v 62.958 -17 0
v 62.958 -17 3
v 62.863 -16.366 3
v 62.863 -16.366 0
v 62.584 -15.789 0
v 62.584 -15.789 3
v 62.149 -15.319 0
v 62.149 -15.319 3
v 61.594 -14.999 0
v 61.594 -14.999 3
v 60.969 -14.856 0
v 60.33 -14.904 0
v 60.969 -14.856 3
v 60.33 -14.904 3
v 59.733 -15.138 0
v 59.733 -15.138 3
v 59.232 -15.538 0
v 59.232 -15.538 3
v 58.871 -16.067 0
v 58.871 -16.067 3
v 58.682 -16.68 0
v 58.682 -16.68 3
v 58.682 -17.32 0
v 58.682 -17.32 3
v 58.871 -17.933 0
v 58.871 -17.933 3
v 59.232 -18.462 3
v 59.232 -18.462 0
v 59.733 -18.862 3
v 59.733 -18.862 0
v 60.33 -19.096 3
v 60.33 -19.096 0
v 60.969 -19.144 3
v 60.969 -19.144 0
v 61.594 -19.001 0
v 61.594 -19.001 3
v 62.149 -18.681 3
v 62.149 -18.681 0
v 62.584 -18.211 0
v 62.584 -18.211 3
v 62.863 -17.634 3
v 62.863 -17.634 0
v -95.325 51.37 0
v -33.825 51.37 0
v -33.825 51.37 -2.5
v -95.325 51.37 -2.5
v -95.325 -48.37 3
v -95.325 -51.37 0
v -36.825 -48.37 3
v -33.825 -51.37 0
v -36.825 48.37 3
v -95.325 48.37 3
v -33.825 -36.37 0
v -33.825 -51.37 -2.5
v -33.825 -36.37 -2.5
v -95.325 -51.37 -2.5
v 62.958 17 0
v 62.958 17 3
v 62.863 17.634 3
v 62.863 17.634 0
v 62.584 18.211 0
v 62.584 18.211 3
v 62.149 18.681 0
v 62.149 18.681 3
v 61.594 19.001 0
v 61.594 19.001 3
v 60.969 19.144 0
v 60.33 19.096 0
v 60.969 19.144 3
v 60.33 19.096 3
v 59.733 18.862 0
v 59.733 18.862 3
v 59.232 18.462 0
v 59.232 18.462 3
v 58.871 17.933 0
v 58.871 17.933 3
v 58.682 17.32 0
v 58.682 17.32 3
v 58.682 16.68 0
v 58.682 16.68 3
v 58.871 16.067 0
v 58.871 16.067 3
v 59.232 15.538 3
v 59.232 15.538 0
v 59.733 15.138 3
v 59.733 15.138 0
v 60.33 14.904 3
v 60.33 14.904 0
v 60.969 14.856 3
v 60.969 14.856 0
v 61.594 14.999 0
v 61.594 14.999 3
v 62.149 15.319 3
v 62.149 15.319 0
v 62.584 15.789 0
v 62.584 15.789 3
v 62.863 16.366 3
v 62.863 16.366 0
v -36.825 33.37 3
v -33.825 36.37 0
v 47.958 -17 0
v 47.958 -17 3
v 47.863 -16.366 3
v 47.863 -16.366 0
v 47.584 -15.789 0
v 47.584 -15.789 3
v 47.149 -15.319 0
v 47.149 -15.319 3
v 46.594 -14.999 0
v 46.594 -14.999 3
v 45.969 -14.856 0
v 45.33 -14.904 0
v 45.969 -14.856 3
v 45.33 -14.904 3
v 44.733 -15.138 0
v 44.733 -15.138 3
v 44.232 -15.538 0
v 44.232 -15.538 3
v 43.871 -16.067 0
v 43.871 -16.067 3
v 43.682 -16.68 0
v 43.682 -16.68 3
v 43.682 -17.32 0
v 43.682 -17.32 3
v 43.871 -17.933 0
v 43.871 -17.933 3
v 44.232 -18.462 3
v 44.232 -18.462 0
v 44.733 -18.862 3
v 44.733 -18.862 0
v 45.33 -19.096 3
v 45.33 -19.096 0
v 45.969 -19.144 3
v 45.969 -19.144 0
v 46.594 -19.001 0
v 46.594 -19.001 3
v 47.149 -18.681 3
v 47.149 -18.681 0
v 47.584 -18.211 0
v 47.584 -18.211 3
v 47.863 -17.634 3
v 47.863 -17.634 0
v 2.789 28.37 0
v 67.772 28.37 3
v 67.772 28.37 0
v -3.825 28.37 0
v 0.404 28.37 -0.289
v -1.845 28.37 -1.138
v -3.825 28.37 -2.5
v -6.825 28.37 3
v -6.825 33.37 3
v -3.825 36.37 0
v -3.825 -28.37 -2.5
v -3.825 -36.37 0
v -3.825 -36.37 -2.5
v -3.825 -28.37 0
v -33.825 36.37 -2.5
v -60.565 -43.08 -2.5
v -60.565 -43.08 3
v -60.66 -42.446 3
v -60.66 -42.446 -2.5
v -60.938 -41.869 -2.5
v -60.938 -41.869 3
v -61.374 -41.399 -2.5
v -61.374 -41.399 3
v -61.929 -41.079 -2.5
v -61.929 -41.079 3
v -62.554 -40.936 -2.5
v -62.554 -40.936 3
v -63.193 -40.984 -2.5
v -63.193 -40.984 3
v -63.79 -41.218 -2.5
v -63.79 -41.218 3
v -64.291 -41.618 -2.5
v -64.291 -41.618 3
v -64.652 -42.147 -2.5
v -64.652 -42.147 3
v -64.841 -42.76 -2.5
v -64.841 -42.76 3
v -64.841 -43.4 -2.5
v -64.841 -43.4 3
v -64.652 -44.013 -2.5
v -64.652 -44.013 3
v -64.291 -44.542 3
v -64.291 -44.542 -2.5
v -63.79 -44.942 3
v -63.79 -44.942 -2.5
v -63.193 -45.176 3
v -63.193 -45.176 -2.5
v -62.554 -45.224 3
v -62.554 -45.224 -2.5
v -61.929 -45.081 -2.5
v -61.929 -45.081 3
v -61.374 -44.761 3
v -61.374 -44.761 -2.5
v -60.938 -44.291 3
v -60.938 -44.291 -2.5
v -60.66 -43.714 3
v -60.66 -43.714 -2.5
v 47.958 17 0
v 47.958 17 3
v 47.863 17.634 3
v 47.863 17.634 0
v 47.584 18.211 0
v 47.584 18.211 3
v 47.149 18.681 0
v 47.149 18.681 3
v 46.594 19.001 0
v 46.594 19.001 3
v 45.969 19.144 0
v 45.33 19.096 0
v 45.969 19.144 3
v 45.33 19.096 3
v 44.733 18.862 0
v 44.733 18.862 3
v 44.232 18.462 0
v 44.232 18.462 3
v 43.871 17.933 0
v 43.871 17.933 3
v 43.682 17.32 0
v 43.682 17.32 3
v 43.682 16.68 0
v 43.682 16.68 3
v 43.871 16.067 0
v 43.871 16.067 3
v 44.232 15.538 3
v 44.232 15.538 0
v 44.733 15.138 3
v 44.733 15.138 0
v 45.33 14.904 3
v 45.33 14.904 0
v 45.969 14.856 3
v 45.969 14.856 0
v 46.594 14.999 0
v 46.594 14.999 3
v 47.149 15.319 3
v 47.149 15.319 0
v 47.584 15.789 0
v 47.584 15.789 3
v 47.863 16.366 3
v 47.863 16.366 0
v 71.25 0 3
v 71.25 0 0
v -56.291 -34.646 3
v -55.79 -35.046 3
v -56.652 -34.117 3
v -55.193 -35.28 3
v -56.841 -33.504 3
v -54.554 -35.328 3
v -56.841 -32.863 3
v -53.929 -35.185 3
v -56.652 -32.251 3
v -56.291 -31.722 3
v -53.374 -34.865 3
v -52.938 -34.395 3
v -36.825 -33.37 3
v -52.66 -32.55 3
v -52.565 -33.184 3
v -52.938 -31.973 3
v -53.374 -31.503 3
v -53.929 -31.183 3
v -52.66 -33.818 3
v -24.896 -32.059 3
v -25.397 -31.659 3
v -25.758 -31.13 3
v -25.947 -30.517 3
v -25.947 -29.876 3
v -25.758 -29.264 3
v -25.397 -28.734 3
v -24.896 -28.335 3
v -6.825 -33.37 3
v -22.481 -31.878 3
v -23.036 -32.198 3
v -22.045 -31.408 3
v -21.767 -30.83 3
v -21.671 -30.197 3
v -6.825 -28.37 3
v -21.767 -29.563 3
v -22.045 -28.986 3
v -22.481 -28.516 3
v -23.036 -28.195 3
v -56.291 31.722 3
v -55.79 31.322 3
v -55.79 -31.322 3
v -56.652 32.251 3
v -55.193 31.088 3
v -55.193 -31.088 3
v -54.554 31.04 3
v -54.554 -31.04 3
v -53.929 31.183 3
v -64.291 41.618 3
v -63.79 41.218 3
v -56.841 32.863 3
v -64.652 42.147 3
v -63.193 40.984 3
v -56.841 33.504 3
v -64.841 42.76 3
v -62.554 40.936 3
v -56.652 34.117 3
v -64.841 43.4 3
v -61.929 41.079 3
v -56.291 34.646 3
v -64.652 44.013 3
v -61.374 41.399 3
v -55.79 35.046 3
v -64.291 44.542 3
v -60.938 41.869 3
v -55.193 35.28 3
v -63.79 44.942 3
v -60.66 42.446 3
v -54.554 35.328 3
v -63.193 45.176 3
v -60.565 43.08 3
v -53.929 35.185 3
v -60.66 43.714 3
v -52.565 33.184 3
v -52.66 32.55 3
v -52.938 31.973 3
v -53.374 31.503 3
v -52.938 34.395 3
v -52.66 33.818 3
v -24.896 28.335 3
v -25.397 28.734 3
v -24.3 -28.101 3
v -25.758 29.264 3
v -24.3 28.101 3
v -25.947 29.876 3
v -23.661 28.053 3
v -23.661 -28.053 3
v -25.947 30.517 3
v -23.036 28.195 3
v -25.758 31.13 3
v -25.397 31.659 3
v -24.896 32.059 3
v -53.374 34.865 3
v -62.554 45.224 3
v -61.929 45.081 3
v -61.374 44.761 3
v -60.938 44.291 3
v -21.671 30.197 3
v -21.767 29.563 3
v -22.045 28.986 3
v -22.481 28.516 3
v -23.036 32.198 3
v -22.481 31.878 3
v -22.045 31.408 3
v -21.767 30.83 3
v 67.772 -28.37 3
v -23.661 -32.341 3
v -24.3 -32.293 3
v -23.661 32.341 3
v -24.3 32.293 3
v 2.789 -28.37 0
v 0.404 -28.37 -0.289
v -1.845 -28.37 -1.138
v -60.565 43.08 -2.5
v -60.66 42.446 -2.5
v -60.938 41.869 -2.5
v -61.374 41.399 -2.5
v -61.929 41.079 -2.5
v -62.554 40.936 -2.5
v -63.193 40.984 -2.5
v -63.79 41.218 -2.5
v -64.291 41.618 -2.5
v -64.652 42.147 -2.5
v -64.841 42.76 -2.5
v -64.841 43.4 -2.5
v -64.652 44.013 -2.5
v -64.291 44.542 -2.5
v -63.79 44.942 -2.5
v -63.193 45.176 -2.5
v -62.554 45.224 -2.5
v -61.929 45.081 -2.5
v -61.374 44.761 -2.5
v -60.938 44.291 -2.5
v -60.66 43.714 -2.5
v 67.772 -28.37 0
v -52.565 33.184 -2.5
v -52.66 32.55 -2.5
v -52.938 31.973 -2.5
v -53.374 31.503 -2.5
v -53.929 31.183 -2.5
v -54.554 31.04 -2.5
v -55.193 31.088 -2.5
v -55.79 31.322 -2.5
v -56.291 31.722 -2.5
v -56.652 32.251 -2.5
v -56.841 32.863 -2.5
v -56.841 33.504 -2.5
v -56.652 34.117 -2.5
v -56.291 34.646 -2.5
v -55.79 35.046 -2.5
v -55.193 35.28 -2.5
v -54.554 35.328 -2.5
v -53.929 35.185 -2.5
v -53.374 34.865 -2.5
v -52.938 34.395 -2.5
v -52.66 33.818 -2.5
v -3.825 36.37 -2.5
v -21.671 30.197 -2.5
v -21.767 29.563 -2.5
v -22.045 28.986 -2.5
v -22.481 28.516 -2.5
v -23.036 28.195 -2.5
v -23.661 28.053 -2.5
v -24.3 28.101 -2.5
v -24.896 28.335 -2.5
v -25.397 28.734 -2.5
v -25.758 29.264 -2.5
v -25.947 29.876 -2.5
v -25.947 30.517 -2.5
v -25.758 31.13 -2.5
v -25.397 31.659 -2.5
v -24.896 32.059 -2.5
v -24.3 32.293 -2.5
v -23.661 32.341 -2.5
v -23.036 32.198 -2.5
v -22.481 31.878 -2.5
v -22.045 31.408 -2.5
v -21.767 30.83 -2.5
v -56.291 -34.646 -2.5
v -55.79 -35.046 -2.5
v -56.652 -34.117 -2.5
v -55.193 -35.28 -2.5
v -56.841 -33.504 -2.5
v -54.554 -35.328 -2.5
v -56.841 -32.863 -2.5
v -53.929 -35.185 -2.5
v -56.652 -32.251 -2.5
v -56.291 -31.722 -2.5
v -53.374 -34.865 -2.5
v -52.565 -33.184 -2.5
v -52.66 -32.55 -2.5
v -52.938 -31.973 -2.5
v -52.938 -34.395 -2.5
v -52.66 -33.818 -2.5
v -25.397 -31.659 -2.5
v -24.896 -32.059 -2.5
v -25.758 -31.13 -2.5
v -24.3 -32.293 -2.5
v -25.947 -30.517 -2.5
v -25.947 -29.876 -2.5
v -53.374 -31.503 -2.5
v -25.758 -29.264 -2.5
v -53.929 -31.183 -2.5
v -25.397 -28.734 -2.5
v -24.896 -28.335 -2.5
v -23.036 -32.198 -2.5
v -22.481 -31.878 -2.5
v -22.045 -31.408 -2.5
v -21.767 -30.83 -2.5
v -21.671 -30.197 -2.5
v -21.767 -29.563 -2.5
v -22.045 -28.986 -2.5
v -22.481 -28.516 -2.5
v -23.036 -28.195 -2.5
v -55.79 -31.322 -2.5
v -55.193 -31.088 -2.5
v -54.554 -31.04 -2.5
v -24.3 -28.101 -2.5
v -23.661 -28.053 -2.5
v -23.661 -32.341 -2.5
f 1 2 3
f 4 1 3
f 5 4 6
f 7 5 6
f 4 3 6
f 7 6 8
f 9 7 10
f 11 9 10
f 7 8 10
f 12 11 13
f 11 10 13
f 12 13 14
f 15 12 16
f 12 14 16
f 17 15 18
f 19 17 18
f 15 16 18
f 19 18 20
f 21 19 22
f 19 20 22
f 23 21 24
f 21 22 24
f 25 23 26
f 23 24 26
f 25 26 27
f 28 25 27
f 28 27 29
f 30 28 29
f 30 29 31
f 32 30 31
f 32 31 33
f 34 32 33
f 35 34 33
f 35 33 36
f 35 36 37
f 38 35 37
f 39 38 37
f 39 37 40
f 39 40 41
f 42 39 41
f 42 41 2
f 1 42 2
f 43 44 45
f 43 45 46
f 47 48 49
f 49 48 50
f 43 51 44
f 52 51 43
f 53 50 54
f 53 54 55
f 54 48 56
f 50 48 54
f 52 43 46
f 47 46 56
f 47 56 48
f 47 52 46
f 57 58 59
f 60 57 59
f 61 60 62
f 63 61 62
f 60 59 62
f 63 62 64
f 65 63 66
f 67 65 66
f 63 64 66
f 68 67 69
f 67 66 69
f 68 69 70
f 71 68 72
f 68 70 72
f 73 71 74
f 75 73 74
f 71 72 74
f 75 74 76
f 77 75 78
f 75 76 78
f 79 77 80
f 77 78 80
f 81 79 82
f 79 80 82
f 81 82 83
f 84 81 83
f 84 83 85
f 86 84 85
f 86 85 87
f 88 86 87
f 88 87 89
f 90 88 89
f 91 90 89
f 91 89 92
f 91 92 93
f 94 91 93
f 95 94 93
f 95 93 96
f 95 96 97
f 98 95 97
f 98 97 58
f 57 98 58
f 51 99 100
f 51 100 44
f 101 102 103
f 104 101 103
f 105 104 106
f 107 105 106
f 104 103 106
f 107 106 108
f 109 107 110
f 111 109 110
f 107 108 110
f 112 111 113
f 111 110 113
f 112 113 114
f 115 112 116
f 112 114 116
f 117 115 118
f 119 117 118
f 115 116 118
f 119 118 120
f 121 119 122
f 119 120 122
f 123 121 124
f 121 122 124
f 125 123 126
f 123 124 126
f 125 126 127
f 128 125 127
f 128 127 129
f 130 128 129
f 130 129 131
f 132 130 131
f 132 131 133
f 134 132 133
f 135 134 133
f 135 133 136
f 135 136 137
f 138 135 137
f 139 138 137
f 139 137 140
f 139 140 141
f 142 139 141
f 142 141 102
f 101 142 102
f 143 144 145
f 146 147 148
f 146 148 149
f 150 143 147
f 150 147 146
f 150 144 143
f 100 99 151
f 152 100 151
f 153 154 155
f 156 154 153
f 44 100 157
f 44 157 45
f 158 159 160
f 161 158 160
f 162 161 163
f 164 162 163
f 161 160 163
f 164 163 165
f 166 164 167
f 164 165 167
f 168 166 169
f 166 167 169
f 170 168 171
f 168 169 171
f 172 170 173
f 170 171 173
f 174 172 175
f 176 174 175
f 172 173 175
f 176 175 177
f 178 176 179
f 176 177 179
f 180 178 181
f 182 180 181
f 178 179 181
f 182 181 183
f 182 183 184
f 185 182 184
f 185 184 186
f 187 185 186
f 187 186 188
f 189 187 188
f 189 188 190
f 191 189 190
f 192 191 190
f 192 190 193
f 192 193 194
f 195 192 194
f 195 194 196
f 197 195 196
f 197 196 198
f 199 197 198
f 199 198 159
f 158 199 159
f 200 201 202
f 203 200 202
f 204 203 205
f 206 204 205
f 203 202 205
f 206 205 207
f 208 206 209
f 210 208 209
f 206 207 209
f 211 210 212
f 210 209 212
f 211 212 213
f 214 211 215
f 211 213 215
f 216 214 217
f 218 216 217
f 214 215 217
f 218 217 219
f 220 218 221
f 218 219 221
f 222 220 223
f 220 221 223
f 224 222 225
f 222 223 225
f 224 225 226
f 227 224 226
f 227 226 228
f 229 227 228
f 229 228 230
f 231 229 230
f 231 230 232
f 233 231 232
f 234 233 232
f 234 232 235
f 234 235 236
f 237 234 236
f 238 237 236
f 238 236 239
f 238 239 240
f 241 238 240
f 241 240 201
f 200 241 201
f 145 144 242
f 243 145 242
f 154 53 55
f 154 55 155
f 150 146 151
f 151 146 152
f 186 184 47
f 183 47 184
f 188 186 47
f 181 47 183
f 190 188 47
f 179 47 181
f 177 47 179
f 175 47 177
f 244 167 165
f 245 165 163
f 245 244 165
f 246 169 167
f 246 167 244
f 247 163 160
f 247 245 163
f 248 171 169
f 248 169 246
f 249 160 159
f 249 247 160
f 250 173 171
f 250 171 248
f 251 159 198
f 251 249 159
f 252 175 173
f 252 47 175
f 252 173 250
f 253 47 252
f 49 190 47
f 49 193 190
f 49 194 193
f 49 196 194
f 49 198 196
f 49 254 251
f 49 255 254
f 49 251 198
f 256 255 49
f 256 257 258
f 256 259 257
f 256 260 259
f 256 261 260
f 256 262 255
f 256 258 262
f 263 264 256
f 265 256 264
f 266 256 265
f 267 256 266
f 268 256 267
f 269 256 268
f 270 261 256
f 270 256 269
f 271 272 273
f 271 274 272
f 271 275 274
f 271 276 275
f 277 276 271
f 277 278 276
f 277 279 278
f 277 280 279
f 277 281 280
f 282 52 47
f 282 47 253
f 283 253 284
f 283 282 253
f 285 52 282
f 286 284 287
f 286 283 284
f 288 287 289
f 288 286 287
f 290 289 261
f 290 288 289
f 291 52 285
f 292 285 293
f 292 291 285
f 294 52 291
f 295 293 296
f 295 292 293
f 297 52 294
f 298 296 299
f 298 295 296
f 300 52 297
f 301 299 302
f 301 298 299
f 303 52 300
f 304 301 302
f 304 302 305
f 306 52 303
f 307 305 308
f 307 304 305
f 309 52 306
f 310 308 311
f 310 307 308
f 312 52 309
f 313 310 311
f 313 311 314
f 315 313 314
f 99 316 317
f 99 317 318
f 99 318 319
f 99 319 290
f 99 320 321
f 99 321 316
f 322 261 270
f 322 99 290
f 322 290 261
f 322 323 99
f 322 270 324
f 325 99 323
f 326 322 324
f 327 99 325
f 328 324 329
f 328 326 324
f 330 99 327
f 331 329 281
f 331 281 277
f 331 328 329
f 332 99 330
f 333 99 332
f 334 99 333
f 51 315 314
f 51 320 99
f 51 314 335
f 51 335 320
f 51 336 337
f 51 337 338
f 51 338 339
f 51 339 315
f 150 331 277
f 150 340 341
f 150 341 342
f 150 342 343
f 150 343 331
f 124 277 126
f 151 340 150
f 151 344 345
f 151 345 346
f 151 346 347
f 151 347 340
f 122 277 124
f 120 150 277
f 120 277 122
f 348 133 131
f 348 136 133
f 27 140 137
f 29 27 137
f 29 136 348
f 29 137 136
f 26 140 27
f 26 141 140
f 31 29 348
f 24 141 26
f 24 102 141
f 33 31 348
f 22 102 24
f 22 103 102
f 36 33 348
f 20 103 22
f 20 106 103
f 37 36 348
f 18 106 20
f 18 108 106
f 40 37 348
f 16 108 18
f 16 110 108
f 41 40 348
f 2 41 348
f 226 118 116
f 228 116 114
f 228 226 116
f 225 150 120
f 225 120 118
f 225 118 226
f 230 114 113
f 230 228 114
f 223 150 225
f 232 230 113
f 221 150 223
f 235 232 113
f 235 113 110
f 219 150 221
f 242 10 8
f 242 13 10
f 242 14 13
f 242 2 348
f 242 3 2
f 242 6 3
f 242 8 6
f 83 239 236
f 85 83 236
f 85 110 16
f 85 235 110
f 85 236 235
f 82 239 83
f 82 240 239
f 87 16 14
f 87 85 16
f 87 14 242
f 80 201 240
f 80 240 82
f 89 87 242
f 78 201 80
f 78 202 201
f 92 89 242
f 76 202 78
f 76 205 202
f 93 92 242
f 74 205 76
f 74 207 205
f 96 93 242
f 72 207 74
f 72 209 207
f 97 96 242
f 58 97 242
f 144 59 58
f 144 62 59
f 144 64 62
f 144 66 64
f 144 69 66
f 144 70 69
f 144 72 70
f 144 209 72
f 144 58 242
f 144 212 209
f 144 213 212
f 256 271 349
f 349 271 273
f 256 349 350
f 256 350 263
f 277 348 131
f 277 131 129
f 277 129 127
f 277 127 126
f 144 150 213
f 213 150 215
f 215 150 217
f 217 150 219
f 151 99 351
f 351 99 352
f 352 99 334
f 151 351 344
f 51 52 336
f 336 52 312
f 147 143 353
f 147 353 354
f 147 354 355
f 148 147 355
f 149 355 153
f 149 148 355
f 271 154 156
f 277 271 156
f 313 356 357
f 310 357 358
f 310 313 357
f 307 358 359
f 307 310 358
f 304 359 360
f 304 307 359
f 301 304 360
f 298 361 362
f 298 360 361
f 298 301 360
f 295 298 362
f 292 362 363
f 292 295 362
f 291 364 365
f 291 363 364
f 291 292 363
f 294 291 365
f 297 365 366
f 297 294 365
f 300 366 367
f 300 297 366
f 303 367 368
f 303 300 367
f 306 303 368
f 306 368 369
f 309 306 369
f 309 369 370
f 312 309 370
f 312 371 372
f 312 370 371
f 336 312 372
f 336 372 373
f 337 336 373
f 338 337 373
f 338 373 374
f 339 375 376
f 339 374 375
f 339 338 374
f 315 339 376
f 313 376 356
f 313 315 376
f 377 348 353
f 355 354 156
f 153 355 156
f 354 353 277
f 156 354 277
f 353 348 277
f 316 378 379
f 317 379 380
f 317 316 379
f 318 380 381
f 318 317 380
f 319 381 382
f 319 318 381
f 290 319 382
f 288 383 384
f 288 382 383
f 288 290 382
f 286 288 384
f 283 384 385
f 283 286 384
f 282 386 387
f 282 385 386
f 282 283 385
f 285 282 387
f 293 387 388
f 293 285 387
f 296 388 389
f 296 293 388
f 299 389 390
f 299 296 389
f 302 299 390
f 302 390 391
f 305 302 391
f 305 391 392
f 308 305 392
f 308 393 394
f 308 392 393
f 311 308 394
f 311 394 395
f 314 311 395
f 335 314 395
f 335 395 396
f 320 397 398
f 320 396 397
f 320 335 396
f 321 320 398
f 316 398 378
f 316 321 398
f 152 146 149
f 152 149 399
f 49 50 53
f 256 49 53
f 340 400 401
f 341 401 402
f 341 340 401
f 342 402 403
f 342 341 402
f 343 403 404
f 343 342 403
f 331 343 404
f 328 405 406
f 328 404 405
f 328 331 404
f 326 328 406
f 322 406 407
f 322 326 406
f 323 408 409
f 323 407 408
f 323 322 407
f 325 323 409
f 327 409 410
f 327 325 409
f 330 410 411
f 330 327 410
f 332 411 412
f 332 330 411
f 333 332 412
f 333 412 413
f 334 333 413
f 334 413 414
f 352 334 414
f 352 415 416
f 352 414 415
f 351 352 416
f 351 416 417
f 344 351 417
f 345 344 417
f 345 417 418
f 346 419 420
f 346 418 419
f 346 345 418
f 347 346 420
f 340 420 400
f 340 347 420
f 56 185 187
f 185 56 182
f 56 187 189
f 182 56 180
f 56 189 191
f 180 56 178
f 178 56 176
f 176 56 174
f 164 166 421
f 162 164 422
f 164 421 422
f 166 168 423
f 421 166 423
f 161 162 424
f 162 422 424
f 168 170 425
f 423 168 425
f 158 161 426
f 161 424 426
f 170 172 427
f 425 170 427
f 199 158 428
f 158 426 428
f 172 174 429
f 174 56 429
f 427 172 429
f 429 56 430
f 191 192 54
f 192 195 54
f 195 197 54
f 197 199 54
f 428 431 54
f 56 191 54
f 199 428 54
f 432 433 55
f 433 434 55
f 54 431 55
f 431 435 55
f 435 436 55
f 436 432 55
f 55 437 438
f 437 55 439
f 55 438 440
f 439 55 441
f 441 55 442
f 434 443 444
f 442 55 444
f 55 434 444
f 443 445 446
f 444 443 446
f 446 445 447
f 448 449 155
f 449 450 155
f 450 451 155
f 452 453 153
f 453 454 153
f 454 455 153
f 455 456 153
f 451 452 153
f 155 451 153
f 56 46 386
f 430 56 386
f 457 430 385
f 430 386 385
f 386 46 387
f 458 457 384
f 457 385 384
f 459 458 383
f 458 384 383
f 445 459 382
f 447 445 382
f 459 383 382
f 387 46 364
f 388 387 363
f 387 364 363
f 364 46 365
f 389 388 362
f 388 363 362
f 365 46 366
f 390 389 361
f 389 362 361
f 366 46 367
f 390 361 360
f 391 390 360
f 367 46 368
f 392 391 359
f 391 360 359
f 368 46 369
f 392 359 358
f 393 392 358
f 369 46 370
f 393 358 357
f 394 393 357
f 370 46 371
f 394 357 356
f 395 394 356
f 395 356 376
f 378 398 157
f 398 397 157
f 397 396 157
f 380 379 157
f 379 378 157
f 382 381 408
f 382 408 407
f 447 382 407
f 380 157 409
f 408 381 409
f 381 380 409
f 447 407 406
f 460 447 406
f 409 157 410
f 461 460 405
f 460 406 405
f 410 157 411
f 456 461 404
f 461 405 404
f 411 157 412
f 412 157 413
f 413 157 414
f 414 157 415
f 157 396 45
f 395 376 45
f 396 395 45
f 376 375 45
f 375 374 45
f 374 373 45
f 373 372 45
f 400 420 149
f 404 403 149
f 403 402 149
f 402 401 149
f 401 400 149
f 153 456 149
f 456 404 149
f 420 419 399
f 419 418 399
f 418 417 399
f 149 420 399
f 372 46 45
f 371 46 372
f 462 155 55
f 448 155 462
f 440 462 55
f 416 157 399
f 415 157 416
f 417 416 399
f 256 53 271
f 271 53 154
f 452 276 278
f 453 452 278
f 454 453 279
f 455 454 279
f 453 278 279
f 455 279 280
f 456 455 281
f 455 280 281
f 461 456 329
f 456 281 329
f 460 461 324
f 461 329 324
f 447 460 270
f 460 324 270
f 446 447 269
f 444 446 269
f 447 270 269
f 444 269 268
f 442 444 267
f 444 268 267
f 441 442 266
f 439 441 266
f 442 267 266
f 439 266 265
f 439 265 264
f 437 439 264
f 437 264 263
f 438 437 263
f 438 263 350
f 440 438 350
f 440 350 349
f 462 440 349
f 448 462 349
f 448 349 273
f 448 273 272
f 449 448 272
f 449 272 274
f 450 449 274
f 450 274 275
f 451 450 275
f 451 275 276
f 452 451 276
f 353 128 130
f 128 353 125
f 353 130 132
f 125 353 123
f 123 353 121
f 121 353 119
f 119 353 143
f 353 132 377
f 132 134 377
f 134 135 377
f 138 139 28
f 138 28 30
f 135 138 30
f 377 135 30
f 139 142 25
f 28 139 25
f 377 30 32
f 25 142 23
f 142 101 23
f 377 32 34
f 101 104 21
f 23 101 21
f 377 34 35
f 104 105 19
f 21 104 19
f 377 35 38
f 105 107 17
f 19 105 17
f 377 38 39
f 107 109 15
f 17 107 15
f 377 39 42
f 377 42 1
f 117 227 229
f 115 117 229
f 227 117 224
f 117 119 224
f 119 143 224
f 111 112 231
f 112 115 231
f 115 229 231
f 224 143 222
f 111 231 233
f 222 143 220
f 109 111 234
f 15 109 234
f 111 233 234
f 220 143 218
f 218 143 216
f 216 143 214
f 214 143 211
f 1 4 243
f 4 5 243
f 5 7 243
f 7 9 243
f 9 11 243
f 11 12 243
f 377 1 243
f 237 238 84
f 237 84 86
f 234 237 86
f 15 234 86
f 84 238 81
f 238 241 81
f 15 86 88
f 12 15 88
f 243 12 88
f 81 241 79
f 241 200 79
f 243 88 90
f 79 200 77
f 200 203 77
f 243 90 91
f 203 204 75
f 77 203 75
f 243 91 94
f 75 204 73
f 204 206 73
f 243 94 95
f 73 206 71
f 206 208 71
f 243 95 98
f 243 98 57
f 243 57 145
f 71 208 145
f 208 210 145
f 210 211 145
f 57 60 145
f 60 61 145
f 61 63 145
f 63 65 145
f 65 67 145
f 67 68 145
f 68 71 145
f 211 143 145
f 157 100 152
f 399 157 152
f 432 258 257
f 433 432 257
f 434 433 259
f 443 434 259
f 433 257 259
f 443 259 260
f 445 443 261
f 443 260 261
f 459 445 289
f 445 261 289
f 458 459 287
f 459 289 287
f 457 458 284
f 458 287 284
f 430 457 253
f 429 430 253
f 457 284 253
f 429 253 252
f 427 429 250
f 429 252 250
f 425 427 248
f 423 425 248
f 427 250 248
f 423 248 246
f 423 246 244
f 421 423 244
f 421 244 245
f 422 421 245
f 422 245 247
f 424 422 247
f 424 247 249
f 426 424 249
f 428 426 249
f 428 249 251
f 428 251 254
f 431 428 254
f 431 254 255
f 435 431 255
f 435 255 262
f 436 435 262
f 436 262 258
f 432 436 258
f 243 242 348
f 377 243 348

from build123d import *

# Parameters (mm, degrees)
SKETCH1_W           = 142.5
SKETCH1_H           = 56.74
BOSS_EXTRUDE1_DEPTH = 3
CUT_EXTRUDE1_DEPTH  = 77.749067747
SKETCH3_W           = 2.425
SKETCH3_H           = 56.74
CUT_EXTRUDE2_DEPTH  = 77.749067747
SKETCH4_W           = 65
SKETCH4_H           = 8
SKETCH4_H_2         = 56.74
BOSS_EXTRUDE2_DEPTH = 5.5
FILLET1_R           = 10
SKETCH5_R           = 2.15
CUT_EXTRUDE3_DEPTH  = 81.18472049
BOSS_EXTRUDE5_DEPTH = 5.5
CHAMFER6_SIZE       = 3
SKETCH11_R          = 2.15
CUT_EXTRUDE5_DEPTH  = 109.425008762


with BuildPart() as part:
    # Sketch1 → Boss-Extrude1 (new body)
    with BuildSketch(Plane.XY):
        Rectangle(SKETCH1_W, SKETCH1_H)
    extrude(amount=BOSS_EXTRUDE1_DEPTH)

    # Sketch2 → Cut-Extrude1 (cut, through all)
    with BuildSketch(Plane.XY.offset(3)):
        Polygon((67.771628048, 28.37), (71.25, 0), (71.25, 28.37), align=None)
        Polygon((71.25, -28.37), (71.25, 0), (67.771628048, -28.37), align=None)
    extrude(amount=-CUT_EXTRUDE1_DEPTH, mode=Mode.SUBTRACT)

    # Sketch3 → Cut-Extrude2 (cut, through all)
    with BuildSketch(Plane.XY.offset(3)):
        with Locations((-70.0375, 0)):
            Rectangle(SKETCH3_W, SKETCH3_H)
    extrude(amount=-CUT_EXTRUDE2_DEPTH, mode=Mode.SUBTRACT)

    # Sketch4 → Boss-Extrude2 (add)
    with BuildSketch(Plane.XY.offset(3)):
        with Locations((-36.325, 32.37)):
            Rectangle(SKETCH4_W, SKETCH4_H)
        with Locations((-36.325, 0)):
            Rectangle(SKETCH4_W, SKETCH4_H_2)
        with Locations((-36.325, -32.37)):
            Rectangle(SKETCH4_W, SKETCH4_H)
    extrude(amount=-BOSS_EXTRUDE2_DEPTH)

    # Fillet1
    # the kernel refuses this fillet: 10 mm, written as the material it adds along each edge
    with BuildSketch(Plane(origin=(-3.825, 28.37, 0), x_dir=(1, 0, 0), z_dir=(0, -1, 0))) as fillet1_piece_1:
        with BuildLine():
            CenterArc((6.614378278, -10), FILLET1_R, 90, 41.409622109)
            Line((0, -2.5), (-0.132287566, -2.35))
            ThreePointArc((-0.132287566, -2.35), (-0.2, -1.25), (-0.2, 0))
            Line((-0.2, 0), (0, 0.2))
            Line((0, 0.2), (6.614378278, 0.2))
            Line((6.614378278, 0.2), (6.614378278, 0))
        make_face()
    extrude(amount=56.74)

    # Sketch5 → Cut-Extrude3 (cut, through all)
    with BuildSketch(Plane.XY.offset(3)):
        with Locations((60.808027892, 17)):
            Circle(SKETCH5_R)
        with Locations((60.808027892, -17)):
            Circle(SKETCH5_R)
        with Locations((45.808027892, 17)):
            Circle(SKETCH5_R)
        with Locations((45.808027892, -17)):
            Circle(SKETCH5_R)
    extrude(amount=-CUT_EXTRUDE3_DEPTH, mode=Mode.SUBTRACT)

    # Sketch10 → Boss-Extrude5 (add)
    with BuildSketch(Plane.XY.offset(3)):
        Polygon((-68.825, 36.37), (-33.825, 36.37), (-33.825, 51.37), (-68.825, 51.37), (-95.325, 51.37), (-95.325, -51.37), (-68.825, -51.37), (-33.825, -51.37), (-33.825, -36.37), (-68.825, -36.37), align=None)
    extrude(amount=-BOSS_EXTRUDE5_DEPTH)

    # Chamfer6
    chamfer6_edges = [part.edges().sort_by_distance(p)[0] for p in [
        (-18.825, 36.37, 3),
        (-18.825, -36.37, 3),
        (-33.825, 43.87, 3),
        (-64.575, 51.37, 3),
        (-64.575, -51.37, 3),
        (-33.825, -43.87, 3),
        (-3.825, 32.37, 3),
        (-3.825, -32.37, 3),
    ]]
    chamfer(chamfer6_edges, length=CHAMFER6_SIZE)

    # Sketch11 → Cut-Extrude5 (cut, through all)
    with BuildSketch(Plane.XY.offset(3)):
        with Locations((-62.71489096, -43.079989287)):
            Circle(SKETCH11_R)
        with Locations((-54.714891019, -33.183924722)):
            Circle(SKETCH11_R)
        with Locations((-23.821377075, -30.196715875)):
            Circle(SKETCH11_R)
    cut_extrude5 = extrude(amount=-CUT_EXTRUDE5_DEPTH, mode=Mode.SUBTRACT)

    # Mirror2: Cut-Extrude5 across plane
    add(cut_extrude5.mirror(Plane.ZX), mode=Mode.SUBTRACT)


solid = part.part
